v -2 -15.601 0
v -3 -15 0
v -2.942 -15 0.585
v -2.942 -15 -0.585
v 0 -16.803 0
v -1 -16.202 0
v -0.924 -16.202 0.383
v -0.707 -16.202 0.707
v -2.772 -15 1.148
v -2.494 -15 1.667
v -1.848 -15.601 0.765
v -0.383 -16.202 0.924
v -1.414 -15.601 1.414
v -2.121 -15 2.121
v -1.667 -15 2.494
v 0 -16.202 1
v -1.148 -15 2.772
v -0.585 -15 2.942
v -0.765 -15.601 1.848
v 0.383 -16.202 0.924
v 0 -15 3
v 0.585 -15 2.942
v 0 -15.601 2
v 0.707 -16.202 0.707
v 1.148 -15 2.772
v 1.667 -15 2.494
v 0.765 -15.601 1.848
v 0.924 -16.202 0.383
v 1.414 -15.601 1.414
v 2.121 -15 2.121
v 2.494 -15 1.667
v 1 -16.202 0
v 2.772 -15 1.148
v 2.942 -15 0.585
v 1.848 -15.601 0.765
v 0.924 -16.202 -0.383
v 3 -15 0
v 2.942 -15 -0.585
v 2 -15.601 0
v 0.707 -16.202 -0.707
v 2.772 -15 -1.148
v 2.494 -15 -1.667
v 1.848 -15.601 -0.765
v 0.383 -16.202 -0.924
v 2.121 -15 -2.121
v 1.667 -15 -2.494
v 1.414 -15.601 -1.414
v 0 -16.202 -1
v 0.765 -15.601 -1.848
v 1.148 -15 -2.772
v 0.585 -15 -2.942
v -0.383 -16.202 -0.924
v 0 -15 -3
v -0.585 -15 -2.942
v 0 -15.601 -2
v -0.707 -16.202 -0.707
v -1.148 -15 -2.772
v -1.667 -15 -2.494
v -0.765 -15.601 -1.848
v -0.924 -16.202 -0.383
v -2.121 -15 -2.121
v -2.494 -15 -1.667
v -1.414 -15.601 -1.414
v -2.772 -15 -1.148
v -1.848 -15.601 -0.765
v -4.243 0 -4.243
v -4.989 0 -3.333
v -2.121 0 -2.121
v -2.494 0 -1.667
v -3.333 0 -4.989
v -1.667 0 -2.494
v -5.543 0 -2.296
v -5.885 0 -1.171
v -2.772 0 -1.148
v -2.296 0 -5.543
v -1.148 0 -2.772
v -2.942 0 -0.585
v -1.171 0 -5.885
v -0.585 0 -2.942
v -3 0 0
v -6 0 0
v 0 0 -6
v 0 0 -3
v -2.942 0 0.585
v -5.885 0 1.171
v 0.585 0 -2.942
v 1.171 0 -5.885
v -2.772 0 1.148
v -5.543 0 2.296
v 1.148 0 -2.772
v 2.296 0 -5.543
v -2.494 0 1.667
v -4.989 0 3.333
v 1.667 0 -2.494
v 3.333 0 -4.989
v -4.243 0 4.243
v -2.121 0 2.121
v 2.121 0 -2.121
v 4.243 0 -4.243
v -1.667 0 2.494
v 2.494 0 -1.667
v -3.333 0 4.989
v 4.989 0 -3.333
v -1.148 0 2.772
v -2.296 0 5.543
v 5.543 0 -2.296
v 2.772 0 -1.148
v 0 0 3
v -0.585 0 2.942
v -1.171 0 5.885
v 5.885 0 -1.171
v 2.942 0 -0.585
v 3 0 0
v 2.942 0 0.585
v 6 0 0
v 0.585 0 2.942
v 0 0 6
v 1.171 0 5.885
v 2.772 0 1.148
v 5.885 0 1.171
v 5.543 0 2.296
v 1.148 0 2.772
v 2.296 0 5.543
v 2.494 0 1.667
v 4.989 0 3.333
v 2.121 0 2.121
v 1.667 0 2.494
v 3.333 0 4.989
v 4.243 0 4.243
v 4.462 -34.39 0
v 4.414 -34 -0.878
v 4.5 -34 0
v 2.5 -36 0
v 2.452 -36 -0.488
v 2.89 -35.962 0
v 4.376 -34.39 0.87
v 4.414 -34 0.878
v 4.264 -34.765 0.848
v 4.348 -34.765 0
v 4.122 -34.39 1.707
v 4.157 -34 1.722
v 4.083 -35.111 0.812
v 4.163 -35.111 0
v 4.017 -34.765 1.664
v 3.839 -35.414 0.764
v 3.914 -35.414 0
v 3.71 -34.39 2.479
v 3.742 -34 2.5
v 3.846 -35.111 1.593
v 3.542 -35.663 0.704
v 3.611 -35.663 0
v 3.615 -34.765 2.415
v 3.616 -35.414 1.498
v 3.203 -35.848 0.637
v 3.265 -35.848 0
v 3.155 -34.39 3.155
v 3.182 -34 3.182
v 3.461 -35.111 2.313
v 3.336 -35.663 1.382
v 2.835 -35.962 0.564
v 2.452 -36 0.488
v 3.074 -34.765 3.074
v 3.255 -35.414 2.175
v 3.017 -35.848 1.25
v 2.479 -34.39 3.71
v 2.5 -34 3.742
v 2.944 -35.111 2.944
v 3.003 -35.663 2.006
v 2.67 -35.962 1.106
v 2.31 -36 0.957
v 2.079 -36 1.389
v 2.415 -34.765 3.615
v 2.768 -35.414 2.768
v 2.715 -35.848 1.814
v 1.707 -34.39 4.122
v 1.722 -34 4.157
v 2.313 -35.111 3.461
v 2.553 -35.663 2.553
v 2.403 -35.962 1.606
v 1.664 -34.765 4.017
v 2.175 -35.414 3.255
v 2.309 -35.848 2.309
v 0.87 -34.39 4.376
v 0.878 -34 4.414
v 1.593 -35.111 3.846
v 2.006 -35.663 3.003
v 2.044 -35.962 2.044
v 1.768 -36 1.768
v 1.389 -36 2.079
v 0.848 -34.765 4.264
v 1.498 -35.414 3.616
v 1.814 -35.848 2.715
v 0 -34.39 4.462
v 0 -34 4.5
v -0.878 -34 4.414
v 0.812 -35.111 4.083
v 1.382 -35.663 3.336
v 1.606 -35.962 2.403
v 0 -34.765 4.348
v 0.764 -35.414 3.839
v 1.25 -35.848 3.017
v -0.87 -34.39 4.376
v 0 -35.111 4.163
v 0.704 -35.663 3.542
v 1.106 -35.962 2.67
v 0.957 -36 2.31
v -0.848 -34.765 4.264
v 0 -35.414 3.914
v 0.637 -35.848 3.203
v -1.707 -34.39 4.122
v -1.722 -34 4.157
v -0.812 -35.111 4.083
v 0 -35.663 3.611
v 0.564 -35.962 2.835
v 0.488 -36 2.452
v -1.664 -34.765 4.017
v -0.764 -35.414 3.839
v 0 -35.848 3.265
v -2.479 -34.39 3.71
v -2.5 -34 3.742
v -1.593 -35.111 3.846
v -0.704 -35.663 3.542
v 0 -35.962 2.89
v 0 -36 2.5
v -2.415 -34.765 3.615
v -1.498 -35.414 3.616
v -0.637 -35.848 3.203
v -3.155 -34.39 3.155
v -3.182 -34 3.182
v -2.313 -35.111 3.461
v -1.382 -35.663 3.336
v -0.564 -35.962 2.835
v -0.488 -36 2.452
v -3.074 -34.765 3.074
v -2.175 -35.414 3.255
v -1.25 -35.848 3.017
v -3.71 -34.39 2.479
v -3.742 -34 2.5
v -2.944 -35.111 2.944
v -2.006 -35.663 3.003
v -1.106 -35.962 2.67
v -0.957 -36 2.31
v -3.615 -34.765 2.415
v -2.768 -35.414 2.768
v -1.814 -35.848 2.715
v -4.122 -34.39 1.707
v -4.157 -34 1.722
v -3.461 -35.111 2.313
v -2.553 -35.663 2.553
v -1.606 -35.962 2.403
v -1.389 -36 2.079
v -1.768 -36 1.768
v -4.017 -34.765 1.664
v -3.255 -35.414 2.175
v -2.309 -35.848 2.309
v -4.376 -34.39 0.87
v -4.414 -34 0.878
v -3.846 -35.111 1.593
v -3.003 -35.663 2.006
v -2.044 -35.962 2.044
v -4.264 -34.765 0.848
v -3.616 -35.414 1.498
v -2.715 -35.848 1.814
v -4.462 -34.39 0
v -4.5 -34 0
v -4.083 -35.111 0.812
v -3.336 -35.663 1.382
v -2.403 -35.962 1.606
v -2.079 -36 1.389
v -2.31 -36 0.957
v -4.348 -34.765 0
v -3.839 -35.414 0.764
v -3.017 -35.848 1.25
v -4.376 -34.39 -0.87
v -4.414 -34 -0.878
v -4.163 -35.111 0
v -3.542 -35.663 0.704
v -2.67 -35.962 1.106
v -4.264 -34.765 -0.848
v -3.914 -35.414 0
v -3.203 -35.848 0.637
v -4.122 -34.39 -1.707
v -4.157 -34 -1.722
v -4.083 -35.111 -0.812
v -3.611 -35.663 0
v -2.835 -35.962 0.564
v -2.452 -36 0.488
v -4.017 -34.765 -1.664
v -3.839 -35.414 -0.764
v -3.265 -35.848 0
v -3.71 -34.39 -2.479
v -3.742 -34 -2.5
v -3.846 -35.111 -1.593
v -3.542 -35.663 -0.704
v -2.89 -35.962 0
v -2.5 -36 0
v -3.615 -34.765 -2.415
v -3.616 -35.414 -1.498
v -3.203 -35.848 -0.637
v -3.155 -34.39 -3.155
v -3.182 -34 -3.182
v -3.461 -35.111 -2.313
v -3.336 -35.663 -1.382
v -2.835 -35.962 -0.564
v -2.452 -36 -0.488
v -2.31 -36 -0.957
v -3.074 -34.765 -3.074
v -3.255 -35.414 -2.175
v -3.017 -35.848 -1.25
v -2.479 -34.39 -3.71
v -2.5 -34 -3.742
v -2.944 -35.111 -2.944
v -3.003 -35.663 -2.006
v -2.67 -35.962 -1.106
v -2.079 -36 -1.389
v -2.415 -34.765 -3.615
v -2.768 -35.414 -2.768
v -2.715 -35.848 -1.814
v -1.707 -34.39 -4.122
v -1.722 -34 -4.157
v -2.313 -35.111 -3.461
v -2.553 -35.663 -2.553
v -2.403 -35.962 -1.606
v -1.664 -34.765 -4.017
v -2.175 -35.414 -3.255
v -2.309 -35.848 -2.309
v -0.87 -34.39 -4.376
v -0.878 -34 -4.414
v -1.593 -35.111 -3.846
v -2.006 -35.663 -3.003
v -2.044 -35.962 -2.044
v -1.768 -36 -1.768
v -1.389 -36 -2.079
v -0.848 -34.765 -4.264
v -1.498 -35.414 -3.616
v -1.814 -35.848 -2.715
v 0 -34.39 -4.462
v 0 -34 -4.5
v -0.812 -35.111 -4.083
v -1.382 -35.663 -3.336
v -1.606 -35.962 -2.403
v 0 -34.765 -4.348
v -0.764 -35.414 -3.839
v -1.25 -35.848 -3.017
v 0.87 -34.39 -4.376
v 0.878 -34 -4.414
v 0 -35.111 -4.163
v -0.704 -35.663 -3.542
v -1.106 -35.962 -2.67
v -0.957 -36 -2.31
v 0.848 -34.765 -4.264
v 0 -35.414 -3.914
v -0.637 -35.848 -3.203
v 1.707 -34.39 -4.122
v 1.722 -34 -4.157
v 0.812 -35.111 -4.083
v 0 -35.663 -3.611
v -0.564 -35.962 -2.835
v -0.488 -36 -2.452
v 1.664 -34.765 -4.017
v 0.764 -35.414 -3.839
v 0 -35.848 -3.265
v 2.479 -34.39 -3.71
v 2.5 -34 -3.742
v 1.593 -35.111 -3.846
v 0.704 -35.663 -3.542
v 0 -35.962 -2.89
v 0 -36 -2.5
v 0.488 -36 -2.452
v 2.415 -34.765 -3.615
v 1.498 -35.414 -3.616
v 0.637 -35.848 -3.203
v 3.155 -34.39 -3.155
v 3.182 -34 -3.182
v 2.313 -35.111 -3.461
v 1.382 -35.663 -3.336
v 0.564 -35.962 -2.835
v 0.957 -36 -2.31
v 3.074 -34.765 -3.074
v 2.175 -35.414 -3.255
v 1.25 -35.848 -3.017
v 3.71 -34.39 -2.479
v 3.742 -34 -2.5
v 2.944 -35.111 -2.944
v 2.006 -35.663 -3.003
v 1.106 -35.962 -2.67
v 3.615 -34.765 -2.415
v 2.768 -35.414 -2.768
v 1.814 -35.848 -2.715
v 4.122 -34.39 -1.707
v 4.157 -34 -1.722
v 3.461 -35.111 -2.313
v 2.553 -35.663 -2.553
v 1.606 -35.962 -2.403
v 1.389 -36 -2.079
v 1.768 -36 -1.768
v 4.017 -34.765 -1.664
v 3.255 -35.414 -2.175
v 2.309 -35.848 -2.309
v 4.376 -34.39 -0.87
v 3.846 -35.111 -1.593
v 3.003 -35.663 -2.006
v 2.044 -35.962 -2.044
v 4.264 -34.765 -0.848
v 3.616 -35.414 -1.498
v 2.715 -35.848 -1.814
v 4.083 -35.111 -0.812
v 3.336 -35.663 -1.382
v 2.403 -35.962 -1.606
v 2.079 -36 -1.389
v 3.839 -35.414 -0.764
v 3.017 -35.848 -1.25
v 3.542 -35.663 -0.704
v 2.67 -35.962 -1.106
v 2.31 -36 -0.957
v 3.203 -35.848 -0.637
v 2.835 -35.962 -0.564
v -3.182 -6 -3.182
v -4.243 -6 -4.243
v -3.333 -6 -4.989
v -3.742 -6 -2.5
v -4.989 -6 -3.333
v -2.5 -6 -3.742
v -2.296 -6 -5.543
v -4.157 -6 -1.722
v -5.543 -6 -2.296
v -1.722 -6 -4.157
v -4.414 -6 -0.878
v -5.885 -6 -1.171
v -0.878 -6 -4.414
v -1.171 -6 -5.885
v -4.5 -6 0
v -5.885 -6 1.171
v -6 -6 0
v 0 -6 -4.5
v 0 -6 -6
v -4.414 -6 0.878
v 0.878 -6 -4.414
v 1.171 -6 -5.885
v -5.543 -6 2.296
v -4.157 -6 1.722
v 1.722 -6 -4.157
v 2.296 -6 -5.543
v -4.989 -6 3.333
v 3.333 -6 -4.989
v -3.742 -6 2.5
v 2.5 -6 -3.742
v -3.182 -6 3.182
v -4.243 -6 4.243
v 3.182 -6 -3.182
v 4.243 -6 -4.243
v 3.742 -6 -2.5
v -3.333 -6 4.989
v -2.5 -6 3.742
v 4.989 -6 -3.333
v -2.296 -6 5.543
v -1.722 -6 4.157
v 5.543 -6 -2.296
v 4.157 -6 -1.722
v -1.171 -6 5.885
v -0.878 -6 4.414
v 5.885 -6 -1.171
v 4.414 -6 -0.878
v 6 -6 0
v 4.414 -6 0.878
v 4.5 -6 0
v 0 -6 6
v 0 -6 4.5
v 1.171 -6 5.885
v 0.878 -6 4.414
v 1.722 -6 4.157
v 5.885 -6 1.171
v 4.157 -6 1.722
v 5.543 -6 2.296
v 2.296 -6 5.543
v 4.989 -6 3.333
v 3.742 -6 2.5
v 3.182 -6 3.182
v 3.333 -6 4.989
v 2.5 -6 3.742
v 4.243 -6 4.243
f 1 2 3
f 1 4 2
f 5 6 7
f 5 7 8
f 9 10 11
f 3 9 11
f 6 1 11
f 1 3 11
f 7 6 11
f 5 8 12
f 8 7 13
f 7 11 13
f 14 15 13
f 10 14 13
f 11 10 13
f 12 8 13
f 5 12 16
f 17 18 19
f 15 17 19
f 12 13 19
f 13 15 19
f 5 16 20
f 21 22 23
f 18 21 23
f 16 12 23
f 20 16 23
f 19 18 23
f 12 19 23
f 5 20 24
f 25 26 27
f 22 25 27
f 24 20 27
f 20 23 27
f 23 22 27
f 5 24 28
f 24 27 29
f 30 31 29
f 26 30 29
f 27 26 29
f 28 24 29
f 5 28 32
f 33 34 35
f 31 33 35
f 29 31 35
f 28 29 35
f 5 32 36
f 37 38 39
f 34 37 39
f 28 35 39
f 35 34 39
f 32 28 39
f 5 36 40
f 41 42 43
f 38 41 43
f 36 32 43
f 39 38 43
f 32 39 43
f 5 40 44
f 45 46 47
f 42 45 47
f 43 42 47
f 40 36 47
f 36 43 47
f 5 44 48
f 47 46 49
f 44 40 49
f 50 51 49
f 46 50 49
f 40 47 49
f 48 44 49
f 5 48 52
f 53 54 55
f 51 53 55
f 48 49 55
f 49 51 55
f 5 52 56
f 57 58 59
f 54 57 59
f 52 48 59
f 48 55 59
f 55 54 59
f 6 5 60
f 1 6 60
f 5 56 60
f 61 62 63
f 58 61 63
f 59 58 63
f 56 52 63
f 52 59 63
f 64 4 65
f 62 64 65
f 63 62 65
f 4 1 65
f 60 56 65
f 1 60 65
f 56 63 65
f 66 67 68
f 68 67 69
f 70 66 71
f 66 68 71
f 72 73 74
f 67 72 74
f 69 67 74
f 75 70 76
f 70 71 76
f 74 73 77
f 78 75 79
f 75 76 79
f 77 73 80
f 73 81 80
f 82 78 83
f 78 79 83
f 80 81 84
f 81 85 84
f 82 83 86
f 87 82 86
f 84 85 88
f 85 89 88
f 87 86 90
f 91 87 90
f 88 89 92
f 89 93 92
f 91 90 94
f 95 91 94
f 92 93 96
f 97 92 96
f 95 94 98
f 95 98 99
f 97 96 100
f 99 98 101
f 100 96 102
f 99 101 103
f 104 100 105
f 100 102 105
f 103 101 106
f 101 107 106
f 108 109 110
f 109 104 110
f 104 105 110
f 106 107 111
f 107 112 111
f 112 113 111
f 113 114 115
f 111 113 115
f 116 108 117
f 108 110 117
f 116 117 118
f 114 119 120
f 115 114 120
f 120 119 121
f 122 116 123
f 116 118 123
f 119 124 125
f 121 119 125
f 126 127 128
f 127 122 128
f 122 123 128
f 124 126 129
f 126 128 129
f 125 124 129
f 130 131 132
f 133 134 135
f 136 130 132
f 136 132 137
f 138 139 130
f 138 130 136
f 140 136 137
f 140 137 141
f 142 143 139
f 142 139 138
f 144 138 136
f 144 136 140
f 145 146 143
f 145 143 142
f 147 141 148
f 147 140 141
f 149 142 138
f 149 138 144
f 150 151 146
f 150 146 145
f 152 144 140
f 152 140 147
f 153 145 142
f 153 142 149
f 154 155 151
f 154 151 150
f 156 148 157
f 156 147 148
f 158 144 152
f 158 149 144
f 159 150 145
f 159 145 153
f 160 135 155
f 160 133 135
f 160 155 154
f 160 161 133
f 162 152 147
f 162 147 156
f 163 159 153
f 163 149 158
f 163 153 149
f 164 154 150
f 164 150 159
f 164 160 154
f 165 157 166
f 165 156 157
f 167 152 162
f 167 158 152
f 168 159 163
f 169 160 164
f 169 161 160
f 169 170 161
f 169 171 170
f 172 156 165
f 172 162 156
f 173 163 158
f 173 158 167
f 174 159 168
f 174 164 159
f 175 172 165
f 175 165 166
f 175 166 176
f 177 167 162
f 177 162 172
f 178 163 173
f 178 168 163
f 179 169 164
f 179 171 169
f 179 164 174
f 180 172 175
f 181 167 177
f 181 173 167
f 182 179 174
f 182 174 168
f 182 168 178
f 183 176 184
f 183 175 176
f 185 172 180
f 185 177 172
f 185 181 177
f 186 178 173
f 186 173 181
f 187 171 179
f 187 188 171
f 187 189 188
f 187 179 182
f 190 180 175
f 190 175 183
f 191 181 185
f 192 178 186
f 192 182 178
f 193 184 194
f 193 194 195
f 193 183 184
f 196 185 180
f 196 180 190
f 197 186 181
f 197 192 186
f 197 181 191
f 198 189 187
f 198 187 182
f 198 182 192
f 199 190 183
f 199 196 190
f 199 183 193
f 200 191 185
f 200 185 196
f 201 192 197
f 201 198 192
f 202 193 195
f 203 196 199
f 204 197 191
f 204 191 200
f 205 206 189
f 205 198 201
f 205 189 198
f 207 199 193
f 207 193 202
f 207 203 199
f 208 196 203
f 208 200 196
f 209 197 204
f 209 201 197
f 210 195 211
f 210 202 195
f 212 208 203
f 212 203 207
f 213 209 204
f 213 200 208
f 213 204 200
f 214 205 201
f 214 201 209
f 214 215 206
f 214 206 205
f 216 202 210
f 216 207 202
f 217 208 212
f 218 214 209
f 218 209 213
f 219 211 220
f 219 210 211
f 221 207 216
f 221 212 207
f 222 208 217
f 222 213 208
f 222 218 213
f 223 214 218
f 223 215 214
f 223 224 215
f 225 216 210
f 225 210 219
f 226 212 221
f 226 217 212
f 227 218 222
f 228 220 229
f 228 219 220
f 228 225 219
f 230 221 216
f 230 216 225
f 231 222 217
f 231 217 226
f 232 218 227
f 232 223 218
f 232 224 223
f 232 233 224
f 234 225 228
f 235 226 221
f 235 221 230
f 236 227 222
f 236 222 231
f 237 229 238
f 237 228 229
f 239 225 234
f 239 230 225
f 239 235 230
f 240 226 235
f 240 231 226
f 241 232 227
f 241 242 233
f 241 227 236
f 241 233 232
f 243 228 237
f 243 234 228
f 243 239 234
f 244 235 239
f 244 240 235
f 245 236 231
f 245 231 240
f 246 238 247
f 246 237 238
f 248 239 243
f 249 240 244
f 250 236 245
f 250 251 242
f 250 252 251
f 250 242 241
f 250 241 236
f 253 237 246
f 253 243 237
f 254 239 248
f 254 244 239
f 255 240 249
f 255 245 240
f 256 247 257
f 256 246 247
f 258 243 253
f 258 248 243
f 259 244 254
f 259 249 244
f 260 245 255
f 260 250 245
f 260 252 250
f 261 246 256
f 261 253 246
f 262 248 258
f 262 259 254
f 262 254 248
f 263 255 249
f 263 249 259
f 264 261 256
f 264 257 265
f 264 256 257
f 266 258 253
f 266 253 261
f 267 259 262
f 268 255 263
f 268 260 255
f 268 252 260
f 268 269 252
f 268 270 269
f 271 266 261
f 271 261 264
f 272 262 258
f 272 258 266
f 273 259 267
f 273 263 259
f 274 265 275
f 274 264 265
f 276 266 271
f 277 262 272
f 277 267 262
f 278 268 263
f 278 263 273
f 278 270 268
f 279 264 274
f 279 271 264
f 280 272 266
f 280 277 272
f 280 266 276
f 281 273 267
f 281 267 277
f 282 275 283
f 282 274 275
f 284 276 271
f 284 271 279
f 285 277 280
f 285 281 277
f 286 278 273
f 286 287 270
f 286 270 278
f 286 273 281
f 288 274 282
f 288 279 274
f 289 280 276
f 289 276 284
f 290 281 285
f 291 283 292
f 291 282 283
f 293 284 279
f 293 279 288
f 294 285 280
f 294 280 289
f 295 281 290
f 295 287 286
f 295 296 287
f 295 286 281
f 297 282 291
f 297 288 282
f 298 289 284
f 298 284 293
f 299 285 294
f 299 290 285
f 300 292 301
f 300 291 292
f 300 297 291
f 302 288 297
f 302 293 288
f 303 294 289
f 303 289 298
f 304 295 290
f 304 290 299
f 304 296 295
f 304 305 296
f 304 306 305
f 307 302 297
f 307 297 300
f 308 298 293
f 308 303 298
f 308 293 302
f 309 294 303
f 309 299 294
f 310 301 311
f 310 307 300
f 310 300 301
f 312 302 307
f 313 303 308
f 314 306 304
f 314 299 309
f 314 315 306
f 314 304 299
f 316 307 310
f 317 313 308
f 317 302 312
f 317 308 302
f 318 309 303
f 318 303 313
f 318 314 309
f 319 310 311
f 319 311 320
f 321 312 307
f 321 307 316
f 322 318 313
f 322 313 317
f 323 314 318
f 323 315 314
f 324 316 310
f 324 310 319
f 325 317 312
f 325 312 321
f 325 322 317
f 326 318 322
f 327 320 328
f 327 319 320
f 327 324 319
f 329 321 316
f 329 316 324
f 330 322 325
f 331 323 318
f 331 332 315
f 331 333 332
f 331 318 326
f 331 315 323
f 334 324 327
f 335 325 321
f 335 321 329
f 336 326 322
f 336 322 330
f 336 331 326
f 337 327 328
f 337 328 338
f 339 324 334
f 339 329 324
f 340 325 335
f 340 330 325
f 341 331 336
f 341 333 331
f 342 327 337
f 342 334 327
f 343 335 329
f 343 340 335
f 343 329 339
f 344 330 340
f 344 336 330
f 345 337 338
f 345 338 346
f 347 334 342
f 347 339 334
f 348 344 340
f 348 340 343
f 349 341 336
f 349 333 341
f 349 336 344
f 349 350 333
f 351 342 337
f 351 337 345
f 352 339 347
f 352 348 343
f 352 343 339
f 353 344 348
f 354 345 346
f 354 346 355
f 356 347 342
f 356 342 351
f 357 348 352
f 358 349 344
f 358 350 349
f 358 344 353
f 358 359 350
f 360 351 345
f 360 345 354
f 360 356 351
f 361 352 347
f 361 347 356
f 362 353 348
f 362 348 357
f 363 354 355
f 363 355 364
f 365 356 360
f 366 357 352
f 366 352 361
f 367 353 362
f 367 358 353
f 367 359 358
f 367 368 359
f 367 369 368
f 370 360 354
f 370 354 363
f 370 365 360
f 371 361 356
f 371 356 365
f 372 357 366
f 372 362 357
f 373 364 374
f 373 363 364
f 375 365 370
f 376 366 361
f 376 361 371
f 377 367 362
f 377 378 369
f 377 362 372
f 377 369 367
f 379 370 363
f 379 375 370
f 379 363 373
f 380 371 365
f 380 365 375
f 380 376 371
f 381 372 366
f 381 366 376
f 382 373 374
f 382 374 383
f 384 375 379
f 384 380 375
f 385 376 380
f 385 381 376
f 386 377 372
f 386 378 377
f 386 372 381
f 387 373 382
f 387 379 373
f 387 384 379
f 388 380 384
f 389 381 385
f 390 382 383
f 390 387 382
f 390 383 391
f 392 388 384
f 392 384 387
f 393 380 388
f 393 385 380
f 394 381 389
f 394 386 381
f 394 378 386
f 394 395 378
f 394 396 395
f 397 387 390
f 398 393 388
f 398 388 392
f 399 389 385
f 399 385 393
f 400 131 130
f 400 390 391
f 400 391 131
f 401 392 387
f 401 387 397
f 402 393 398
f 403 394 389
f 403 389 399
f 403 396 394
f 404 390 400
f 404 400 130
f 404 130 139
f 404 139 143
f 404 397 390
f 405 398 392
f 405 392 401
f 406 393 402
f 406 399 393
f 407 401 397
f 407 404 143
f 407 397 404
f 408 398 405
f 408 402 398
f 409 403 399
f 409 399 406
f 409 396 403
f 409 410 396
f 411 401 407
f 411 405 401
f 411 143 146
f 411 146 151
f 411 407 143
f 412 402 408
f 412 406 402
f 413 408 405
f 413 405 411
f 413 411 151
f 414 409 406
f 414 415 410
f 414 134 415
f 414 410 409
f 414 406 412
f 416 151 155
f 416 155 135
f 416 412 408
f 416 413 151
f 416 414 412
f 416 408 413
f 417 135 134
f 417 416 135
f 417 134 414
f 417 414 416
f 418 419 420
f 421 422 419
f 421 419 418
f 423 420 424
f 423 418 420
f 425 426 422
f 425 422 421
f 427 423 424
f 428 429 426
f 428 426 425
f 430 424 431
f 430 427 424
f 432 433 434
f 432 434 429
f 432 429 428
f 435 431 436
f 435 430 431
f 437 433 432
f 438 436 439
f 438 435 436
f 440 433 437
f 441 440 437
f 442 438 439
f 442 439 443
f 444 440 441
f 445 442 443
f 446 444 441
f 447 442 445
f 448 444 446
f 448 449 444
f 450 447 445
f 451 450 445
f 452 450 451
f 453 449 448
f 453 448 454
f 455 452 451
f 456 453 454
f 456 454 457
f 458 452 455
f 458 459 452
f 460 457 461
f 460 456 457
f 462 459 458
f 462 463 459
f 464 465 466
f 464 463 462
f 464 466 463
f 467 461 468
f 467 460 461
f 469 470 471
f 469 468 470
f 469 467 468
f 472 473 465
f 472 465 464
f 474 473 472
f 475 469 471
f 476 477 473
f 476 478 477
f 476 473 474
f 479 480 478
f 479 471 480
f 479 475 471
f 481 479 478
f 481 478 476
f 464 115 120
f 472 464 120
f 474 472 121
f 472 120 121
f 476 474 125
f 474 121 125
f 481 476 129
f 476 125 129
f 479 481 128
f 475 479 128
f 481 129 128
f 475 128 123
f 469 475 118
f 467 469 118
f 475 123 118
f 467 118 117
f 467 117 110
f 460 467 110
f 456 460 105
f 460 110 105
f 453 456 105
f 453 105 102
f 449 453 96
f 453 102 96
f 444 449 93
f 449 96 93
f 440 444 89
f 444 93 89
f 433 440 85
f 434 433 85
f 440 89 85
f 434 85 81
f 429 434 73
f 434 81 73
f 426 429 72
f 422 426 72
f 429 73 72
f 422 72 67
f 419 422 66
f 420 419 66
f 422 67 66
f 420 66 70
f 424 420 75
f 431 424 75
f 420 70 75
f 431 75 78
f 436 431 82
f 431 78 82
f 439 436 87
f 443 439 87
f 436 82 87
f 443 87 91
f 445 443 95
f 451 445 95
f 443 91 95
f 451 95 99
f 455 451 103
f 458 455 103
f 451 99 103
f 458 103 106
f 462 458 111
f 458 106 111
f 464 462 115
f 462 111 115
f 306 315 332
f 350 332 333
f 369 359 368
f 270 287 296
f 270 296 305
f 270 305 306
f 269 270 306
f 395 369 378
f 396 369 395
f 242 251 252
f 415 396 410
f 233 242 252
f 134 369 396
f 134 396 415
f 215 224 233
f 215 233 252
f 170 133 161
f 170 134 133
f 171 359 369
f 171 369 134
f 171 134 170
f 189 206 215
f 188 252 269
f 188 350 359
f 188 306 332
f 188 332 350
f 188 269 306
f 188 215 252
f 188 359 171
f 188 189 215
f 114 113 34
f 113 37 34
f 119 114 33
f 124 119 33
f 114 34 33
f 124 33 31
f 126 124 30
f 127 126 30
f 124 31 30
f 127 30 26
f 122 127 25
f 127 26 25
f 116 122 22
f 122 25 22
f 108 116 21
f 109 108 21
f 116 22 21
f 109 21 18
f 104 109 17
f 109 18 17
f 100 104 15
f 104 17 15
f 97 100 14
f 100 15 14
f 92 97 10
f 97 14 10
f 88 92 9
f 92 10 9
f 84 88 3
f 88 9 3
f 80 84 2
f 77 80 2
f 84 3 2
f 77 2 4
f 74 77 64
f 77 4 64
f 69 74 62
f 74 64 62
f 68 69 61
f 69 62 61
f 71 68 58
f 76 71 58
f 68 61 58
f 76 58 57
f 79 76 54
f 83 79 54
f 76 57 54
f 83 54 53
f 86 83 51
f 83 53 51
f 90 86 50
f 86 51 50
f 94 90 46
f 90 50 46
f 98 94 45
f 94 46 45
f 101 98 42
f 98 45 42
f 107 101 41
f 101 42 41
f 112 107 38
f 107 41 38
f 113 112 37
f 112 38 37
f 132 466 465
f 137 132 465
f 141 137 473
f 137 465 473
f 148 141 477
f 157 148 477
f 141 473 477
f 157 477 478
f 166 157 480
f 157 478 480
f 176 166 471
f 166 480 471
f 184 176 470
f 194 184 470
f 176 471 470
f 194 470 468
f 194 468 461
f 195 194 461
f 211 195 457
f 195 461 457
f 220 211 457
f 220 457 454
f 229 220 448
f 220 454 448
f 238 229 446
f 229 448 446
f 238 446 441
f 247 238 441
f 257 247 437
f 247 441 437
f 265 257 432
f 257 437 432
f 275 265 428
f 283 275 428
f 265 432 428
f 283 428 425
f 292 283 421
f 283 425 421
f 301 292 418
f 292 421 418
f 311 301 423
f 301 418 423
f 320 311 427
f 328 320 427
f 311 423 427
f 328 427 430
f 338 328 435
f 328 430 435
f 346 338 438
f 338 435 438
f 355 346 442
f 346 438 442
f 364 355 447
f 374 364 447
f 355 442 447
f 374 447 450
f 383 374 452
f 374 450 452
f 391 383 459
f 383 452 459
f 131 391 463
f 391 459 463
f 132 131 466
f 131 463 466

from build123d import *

# Parameters (mm, degrees)
F0_R     = 6
F1_DEPTH = 6
F2_R     = 4.5
F3_DEPTH = 30
F4_R     = 2
F6_D     = 6
F6_DEPTH = 15
F6_TIP   = 1.8025818571


with BuildPart() as f1:
    # F0 (on Front) → F1 (new body)
    with BuildSketch(Plane.XZ):
        Circle(F0_R)
    extrude(amount=F1_DEPTH)

    # F2 (on face) → F3 (join)
    with BuildSketch(Plane.XZ.offset(6)):
        Circle(F2_R)
    extrude(amount=F3_DEPTH)

    # F4
    f4_edges = [f1.edges().sort_by_distance(p)[0] for p in [
        (-4.5, -36, 0),
    ]]
    fillet(f4_edges, radius=F4_R)

    # F6
    with Locations(Plane(origin=(0, 0, 0), x_dir=(-1, 0, 0), z_dir=(0, 1, 0))):
        with Locations((0, 0)):
            Hole(F6_D / 2, depth=F6_DEPTH)
            with Locations((0, 0, -(F6_DEPTH + F6_TIP / 2))):  # 118° drill point
                Cone(0, F6_D / 2, F6_TIP, mode=Mode.SUBTRACT)


solid = f1.part
